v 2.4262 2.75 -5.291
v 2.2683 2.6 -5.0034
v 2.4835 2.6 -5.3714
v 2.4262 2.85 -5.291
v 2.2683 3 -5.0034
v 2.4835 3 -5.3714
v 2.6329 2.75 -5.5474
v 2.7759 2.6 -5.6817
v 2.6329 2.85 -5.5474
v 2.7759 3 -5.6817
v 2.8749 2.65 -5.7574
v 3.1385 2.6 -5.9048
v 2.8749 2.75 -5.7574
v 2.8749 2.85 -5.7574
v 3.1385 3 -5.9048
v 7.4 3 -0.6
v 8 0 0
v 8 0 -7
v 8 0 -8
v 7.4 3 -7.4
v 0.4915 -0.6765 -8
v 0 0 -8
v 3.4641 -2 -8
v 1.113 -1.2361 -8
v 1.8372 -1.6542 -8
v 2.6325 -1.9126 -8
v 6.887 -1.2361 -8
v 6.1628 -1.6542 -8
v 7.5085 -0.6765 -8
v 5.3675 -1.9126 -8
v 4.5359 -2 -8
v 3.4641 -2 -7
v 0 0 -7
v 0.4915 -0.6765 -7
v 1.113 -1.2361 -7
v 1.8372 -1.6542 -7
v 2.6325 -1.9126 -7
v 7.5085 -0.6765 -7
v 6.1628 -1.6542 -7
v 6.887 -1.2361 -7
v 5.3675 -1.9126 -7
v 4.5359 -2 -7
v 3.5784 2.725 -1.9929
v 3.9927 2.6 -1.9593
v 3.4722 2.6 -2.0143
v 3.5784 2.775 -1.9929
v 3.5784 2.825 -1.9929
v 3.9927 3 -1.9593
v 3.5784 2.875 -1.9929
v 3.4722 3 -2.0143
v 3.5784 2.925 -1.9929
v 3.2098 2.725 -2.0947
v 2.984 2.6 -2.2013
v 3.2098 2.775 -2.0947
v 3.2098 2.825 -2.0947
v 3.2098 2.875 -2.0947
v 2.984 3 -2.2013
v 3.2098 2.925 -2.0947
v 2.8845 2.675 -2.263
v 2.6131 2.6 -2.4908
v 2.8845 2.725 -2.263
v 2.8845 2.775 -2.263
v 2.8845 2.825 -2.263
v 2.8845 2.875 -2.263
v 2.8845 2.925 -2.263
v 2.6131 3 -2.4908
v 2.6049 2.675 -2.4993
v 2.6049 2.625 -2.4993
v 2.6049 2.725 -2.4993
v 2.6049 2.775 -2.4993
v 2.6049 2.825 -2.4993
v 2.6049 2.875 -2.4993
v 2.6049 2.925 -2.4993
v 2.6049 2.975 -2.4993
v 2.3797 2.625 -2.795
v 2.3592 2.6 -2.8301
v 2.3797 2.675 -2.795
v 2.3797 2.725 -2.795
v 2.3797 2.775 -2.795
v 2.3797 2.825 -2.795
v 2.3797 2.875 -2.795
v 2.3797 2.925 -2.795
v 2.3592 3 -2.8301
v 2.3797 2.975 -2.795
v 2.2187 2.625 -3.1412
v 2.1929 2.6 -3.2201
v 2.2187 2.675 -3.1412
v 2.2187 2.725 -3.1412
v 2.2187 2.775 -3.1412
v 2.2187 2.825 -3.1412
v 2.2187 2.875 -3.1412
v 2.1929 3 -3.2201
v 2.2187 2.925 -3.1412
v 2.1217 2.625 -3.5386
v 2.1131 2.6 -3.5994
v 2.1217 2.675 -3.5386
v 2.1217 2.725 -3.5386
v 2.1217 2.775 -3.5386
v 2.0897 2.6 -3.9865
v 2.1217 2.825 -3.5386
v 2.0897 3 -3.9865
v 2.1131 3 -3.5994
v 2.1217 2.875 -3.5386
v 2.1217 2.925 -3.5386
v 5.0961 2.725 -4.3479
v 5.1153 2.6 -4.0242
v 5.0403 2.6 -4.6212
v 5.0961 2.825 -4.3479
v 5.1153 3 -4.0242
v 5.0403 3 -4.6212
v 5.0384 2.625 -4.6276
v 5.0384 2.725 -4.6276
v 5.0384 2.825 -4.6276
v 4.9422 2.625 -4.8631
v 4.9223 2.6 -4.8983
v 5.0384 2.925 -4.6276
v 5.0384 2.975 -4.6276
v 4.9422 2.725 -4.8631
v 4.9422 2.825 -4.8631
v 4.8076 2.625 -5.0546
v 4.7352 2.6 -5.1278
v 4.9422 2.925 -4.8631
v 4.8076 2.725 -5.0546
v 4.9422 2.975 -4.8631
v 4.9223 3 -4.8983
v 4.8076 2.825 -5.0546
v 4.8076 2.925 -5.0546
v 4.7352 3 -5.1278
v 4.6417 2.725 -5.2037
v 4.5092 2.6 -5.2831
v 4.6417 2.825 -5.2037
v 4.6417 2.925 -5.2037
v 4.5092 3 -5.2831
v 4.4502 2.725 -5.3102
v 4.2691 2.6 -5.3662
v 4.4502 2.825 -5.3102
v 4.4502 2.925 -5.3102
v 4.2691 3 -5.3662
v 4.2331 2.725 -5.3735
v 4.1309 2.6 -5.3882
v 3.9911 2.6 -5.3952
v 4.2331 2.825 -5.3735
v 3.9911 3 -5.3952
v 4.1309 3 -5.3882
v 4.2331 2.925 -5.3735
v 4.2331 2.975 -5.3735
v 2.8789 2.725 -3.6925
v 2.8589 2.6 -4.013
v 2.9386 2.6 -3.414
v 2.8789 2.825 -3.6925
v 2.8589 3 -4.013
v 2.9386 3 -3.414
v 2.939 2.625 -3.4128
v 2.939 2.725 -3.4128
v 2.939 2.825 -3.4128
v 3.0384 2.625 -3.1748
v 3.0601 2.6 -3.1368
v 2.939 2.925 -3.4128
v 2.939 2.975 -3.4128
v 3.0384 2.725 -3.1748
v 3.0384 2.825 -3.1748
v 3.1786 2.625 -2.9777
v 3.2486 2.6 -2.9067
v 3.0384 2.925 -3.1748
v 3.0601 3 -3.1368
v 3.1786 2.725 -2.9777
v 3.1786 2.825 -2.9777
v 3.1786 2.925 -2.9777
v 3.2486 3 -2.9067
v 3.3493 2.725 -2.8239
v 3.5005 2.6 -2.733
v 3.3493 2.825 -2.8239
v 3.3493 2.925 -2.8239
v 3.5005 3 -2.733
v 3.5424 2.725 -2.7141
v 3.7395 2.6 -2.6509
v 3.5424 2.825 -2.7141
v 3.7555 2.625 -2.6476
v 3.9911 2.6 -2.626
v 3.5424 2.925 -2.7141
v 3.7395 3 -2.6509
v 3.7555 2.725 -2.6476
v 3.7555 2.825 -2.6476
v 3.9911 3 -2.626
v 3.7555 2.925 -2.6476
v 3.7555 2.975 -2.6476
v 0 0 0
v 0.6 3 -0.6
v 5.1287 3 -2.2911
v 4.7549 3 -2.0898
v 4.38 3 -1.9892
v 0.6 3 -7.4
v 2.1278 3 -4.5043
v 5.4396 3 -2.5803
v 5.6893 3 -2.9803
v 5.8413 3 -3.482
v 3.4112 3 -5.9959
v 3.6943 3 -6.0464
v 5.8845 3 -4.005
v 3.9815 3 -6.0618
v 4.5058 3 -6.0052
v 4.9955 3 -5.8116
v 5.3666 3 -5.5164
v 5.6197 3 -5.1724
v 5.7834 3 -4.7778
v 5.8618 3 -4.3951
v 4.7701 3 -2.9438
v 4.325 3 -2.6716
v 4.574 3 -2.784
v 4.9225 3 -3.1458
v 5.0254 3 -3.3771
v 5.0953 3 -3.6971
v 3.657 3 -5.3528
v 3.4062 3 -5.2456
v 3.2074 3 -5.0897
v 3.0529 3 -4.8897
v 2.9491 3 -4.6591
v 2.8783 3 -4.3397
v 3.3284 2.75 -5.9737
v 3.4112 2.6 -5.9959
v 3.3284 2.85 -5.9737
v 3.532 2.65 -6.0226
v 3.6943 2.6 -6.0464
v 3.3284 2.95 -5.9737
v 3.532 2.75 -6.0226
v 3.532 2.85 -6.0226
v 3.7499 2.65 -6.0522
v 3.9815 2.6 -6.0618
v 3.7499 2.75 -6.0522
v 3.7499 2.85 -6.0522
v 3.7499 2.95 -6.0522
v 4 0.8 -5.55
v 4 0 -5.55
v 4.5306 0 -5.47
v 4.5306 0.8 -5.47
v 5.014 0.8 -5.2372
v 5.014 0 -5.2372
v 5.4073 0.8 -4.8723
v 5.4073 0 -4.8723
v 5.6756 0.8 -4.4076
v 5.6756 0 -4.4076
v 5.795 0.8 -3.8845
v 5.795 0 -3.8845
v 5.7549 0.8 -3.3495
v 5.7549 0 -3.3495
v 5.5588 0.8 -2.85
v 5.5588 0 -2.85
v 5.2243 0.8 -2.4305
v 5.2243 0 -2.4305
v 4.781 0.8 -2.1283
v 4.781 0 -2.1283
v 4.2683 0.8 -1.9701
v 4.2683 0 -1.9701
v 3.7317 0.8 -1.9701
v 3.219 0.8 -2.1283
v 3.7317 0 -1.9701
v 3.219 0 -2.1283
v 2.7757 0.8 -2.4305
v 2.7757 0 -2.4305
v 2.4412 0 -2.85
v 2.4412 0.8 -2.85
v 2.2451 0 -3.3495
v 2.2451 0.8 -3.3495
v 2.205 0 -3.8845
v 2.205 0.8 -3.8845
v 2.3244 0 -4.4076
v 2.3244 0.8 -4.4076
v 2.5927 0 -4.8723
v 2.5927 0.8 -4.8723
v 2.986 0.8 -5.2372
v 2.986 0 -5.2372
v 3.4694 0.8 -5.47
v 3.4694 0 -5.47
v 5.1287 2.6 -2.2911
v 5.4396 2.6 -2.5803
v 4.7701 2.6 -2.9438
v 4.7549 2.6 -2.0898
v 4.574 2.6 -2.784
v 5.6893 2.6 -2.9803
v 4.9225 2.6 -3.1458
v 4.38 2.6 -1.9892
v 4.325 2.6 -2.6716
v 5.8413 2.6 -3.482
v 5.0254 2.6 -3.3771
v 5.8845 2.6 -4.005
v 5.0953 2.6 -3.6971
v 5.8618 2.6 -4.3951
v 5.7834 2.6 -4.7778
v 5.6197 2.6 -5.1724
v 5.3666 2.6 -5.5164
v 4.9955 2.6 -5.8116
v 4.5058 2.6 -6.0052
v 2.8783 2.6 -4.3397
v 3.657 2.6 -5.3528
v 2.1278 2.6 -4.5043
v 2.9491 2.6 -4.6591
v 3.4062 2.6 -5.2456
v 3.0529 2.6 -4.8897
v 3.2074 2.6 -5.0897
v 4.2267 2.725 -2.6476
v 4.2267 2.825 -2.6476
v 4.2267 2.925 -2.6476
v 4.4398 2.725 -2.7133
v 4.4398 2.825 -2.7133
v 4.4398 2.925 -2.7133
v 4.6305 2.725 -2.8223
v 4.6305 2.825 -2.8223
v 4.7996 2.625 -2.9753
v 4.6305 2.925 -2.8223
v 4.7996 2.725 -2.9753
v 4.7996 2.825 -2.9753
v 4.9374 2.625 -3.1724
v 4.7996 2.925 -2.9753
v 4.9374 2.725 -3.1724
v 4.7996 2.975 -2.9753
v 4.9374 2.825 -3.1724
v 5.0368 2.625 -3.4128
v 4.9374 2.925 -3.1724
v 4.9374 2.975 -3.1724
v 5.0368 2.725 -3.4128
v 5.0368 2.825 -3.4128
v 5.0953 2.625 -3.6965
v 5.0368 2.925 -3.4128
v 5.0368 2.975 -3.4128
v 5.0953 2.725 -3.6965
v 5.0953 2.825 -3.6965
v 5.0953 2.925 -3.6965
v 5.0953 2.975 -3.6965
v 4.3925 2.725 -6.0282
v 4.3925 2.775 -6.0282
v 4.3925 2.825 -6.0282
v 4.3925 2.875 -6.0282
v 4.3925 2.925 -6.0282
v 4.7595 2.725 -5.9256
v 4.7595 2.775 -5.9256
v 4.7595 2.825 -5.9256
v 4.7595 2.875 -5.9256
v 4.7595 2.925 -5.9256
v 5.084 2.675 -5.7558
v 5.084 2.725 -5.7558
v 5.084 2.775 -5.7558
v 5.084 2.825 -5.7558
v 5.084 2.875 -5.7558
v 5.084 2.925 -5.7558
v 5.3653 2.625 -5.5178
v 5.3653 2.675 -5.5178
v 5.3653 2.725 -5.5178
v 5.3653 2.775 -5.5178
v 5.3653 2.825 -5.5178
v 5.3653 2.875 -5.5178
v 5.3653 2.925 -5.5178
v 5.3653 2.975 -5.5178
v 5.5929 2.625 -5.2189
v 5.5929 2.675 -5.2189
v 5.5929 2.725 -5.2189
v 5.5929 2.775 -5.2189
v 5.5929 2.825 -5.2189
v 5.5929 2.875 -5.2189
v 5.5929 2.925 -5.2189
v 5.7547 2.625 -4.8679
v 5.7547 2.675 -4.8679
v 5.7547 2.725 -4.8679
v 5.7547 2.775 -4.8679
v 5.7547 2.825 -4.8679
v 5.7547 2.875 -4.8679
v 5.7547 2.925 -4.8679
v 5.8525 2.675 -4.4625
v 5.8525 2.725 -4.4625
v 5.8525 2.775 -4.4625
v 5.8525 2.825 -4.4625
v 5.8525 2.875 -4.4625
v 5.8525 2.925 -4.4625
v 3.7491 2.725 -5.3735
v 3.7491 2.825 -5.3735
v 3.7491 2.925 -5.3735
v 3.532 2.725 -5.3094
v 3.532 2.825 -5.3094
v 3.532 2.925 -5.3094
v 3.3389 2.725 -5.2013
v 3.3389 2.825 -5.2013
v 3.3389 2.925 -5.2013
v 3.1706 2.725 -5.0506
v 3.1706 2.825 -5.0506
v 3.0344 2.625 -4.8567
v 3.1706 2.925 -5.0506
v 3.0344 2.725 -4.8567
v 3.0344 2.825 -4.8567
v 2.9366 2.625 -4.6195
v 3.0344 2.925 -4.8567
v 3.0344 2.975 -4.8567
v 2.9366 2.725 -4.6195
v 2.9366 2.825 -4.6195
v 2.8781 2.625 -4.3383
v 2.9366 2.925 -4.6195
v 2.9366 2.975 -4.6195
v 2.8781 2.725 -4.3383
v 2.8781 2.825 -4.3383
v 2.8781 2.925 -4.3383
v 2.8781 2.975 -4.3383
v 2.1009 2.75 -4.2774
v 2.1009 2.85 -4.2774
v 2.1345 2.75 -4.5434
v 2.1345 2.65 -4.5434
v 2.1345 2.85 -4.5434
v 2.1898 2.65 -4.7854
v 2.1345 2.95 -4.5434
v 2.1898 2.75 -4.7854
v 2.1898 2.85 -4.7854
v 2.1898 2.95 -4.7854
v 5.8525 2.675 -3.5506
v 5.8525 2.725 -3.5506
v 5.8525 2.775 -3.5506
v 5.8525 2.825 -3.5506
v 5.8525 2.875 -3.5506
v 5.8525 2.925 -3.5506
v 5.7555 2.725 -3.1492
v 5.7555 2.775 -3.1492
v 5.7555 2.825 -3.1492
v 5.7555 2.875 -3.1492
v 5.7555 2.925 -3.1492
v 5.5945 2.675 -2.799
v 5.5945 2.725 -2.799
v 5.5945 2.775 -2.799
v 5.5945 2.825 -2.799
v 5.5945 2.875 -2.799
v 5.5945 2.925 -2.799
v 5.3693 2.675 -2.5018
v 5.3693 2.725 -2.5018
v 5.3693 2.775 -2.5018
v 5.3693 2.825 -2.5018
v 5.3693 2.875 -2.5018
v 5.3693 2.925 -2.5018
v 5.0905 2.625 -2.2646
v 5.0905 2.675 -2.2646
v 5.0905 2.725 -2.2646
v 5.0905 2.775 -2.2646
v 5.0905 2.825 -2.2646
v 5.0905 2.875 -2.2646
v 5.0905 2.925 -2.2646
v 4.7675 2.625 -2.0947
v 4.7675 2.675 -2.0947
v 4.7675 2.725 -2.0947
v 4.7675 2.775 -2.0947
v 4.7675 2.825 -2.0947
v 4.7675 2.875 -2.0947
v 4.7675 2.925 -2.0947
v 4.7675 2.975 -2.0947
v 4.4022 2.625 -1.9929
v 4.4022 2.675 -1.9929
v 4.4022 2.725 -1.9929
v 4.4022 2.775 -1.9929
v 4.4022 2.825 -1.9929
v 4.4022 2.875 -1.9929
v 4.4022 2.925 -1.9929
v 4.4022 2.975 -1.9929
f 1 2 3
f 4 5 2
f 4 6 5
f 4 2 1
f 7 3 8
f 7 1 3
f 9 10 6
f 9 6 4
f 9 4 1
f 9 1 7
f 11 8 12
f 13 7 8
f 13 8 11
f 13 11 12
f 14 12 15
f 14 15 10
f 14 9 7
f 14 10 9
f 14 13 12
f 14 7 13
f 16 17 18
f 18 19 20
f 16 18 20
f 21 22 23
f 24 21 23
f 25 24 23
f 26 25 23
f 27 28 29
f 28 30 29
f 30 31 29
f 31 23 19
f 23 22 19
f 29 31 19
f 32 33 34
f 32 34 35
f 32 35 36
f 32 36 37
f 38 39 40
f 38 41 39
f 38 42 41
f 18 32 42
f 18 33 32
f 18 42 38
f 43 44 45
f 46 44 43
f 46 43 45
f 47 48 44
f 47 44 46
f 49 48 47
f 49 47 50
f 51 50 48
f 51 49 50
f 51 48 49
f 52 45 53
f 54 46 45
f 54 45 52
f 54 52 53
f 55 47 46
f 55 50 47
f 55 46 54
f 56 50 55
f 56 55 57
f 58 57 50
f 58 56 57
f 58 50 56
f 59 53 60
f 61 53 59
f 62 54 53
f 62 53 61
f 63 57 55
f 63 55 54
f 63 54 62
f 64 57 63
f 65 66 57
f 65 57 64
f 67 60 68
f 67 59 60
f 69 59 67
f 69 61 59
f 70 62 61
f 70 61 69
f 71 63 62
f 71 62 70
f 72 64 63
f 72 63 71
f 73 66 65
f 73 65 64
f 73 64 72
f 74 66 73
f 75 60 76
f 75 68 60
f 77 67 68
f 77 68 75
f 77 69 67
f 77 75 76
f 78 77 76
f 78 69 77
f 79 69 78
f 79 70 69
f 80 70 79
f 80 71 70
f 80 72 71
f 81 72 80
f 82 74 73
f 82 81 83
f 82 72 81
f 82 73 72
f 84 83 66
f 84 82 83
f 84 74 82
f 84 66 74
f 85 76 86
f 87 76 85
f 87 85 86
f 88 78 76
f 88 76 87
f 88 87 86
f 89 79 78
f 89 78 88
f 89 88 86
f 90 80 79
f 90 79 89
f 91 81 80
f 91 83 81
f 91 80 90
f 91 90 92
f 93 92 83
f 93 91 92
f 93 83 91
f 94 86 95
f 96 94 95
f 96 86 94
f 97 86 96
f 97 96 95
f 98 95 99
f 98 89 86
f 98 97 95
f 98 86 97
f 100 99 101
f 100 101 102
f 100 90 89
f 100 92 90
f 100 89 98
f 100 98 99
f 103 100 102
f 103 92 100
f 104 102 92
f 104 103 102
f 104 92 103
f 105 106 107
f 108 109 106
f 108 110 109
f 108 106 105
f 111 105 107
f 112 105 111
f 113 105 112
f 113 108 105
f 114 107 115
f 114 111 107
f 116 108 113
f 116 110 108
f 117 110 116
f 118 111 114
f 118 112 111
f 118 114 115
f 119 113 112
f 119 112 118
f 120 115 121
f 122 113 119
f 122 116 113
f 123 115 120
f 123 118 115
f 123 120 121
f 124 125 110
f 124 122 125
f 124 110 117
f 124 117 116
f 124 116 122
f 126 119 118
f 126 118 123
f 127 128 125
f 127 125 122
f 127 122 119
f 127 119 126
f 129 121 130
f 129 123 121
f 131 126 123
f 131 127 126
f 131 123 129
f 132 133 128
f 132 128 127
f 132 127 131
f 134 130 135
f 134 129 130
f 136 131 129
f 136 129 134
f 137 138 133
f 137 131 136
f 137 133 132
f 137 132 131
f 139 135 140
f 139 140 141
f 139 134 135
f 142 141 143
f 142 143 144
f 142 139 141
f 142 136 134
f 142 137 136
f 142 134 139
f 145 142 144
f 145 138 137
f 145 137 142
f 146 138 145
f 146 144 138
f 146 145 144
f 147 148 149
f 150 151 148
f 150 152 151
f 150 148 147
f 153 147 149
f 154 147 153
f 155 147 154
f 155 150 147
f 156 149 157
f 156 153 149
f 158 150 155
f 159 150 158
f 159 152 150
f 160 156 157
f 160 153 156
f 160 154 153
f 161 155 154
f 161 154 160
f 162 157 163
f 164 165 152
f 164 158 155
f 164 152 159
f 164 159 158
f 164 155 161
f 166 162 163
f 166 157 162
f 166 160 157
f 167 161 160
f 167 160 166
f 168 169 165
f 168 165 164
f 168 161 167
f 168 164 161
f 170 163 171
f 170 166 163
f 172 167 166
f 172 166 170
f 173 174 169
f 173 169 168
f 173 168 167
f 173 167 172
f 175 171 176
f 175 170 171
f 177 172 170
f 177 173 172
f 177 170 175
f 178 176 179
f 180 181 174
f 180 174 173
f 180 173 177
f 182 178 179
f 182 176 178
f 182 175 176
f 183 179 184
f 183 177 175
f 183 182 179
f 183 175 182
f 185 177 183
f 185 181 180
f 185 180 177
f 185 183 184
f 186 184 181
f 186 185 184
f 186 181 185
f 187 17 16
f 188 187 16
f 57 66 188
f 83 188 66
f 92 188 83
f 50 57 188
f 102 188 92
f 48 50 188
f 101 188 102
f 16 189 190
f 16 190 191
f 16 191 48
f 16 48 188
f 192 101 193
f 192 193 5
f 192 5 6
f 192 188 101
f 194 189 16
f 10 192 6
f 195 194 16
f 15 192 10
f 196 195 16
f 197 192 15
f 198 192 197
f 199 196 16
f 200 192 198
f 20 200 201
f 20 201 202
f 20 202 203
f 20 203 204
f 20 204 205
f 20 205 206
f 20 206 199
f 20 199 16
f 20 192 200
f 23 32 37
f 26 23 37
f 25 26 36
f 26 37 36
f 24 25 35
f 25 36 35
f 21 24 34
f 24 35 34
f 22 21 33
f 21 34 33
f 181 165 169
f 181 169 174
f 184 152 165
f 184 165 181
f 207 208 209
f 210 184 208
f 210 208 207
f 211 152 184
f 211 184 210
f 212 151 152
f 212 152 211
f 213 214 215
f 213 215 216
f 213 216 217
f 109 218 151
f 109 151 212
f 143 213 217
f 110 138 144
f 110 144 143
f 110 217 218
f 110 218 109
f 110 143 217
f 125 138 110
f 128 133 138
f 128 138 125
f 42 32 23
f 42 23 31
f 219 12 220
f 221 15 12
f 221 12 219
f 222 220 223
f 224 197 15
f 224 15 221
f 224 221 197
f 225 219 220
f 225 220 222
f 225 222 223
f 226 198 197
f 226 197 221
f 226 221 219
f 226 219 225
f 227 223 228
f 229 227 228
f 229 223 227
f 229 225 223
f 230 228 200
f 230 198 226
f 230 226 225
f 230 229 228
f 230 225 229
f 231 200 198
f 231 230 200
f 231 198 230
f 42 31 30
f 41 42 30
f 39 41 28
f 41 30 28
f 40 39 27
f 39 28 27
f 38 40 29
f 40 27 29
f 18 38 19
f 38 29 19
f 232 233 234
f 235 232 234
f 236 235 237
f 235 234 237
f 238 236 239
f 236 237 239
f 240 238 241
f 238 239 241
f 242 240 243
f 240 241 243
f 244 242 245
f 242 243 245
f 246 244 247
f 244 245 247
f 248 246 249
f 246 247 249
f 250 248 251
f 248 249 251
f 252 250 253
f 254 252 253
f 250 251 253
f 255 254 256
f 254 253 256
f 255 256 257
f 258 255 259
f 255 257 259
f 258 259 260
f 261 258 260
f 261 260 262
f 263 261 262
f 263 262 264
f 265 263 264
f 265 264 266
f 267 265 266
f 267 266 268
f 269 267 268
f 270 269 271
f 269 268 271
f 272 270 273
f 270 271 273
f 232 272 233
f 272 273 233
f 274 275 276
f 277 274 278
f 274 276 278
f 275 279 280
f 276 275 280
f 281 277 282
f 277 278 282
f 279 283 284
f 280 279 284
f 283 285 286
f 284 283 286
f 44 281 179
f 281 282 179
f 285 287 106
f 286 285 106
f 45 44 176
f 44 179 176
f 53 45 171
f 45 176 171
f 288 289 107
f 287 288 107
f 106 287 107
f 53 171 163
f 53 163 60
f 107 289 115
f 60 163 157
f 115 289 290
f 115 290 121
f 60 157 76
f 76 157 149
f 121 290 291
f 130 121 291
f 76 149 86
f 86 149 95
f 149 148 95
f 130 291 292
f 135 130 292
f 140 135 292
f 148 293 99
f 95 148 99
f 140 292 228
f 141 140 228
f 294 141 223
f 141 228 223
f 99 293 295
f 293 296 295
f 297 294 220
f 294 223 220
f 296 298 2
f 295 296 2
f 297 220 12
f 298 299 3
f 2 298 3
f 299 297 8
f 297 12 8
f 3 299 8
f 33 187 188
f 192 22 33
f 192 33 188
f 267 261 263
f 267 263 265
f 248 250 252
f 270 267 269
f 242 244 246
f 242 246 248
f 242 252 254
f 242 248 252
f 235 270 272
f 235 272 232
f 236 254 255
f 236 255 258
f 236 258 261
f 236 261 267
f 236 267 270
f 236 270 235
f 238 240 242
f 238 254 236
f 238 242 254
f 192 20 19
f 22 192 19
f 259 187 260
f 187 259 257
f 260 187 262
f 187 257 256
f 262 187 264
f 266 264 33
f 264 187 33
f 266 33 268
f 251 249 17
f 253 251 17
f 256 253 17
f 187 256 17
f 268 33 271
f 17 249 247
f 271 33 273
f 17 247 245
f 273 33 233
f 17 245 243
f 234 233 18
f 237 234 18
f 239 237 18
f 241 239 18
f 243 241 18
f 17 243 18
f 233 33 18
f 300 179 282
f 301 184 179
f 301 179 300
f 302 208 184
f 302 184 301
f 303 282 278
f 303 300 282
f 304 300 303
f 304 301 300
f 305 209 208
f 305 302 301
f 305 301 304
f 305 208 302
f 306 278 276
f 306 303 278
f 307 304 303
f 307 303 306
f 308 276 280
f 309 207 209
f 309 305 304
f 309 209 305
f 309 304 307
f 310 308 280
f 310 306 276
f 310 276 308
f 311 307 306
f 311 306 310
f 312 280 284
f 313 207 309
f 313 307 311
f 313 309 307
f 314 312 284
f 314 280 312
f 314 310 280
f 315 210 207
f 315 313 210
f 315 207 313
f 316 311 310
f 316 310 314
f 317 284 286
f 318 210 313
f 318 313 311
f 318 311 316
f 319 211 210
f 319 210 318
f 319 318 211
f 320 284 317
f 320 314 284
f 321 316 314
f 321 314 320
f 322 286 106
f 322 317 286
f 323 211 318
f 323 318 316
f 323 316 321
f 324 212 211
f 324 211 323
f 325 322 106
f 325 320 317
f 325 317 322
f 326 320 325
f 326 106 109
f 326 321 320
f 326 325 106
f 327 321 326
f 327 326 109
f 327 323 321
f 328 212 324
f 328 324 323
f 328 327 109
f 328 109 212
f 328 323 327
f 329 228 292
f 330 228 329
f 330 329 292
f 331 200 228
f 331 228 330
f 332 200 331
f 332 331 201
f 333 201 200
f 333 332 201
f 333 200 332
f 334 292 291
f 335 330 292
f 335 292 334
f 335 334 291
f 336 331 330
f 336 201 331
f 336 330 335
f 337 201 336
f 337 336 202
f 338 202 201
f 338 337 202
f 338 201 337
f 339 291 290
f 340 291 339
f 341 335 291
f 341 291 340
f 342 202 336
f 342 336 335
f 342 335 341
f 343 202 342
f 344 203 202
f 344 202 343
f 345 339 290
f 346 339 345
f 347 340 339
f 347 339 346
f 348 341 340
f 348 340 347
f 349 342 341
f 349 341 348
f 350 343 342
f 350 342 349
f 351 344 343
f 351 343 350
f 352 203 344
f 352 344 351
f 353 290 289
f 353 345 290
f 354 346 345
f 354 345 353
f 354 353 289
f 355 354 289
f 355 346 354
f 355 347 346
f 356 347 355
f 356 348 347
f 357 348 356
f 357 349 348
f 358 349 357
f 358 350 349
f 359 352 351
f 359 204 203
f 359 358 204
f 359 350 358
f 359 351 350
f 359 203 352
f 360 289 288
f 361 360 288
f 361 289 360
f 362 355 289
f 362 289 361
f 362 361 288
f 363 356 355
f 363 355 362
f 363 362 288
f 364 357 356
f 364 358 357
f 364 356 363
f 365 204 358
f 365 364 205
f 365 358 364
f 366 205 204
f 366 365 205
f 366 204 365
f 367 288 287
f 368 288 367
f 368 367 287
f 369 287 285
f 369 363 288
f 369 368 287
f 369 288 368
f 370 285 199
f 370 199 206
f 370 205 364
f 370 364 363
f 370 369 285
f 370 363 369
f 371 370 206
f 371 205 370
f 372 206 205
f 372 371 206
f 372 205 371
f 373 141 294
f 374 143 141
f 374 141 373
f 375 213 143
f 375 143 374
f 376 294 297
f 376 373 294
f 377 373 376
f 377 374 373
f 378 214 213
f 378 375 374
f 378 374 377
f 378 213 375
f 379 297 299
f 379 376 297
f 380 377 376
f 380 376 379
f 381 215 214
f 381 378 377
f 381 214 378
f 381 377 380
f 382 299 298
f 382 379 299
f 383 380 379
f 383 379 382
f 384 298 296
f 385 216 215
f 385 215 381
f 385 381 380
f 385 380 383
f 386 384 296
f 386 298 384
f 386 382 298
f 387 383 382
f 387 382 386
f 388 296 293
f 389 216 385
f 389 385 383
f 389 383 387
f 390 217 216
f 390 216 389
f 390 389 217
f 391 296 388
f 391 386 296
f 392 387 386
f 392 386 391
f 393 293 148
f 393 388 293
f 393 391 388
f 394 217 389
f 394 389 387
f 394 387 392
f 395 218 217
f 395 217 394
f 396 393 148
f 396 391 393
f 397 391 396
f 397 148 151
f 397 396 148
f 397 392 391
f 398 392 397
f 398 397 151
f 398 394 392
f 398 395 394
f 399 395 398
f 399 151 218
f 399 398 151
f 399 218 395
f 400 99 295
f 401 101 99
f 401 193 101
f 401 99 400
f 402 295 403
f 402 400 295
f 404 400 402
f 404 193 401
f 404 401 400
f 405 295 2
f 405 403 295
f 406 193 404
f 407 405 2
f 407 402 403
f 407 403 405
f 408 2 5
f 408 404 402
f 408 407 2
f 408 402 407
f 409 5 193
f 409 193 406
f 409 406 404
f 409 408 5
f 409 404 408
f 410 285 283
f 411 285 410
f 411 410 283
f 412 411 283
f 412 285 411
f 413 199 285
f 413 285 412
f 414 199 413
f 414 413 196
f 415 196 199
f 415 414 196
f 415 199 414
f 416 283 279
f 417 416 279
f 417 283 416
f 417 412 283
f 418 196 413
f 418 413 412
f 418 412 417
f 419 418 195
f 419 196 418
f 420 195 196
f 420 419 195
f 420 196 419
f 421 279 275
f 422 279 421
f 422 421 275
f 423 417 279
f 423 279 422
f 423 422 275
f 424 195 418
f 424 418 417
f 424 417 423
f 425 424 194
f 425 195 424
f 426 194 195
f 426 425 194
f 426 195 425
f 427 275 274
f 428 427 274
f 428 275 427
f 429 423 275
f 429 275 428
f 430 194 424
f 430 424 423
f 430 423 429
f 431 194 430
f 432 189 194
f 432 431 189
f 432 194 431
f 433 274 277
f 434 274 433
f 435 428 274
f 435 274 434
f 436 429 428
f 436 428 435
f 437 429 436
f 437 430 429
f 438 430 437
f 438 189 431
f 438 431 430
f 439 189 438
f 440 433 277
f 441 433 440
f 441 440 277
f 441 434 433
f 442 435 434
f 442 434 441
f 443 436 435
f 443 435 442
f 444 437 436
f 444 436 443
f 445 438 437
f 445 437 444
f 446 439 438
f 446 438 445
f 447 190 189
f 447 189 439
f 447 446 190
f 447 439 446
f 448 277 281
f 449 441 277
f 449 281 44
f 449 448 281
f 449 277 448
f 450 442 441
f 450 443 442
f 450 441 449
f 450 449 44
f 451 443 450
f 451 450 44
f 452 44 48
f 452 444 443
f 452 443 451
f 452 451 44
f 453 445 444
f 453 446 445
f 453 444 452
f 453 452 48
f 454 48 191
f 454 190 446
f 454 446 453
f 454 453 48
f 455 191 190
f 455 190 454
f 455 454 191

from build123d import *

# Parameters (mm, degrees)
SKETCH1_W               = 8
SKETCH1_H               = 8
BOSS_EXTRUDE1_DEPTH     = 3
CUT_EXTRUDE1_DEPTH      = 12.704699911
CUT_EXTRUDE1_DEPTH_BACK = 12.704699911
CUT_EXTRUDE2_DEPTH      = 11
SKETCH4_R               = 1.8
CUT_EXTRUDE3_DEPTH      = 0.8
SKETCH5_W               = 8
SKETCH5_H               = 1
BOSS_EXTRUDE2_DEPTH     = 2
FILLET1_R               = 4
CUT_EXTRUDE4_DEPTH      = 0.4


with BuildPart() as part:
    # Sketch1 → Boss-Extrude1 (new body)
    with BuildSketch(Plane(origin=(0, 0, 0), x_dir=(1, 0, 0), z_dir=(0, 1, 0))):
        with Locations((4, 4)):
            Rectangle(SKETCH1_W, SKETCH1_H)
    extrude(amount=BOSS_EXTRUDE1_DEPTH)

    # Sketch2 → Cut-Extrude1 (cut, two sides: drawn at the far end of the back side and taken through both)
    with BuildSketch(Plane.XY.offset(-CUT_EXTRUDE1_DEPTH_BACK)):
        Polygon((0, 0), (0.6, 3), (0, 3), align=None)
        Polygon((8, 0), (7.4, 3), (8, 3), align=None)
    extrude(amount=CUT_EXTRUDE1_DEPTH + CUT_EXTRUDE1_DEPTH_BACK, mode=Mode.SUBTRACT)

    # Sketch3 → Cut-Extrude2 (cut)
    with BuildSketch(Plane(origin=(0, 0, 0), x_dir=(0, 0, -1), z_dir=(1, 0, 0))):
        Polygon((0, 0), (0.6, 3), (0, 3), align=None)
        Polygon((8, 3), (7.4, 3), (8, 0), align=None)
    extrude(amount=CUT_EXTRUDE2_DEPTH, mode=Mode.SUBTRACT)

    # Sketch4 → Cut-Extrude3 (cut)
    with BuildSketch(Plane.XZ):
        with Locations(Location((4, -3.75, 0), (0, 0, 270))):
            Circle(SKETCH4_R)
    extrude(amount=-CUT_EXTRUDE3_DEPTH, mode=Mode.SUBTRACT)

    # Sketch5 → Boss-Extrude2 (add)
    with BuildSketch(Plane.XZ):
        with Locations((4, -7.5)):
            Rectangle(SKETCH5_W, SKETCH5_H)
    extrude(amount=BOSS_EXTRUDE2_DEPTH)

    # Fillet1
    # the kernel refuses this fillet: 4 mm, written as the material it takes off along each edge
    with BuildSketch(Plane(origin=(8, -2, -16.660254038), x_dir=(0, 1, 0), z_dir=(0, 0, 1)), Plane(origin=(0, -2, 1.660254038), x_dir=(0, 1, 0), z_dir=(0, 0, -1))) as fillet1_piece_1:
        with BuildLine():
            CenterArc((4, 3.464101615), FILLET1_R, 180, 60)
            Line((0, 3.464101615), (-0.08, 3.464101615))
            Line((-0.08, 3.464101615), (-0.08, 0))
            Line((-0.08, 0), (0, -0.08))
            ThreePointArc((0, -0.08), (1, -0.08), (1.96, -0.069282032))
            Line((1.96, -0.069282032), (2, 0))
        make_face()
    extrude(amount=18.320508076, mode=Mode.SUBTRACT)

    # Sketch6 → Cut-Extrude4 (cut)
    with BuildSketch(Plane(origin=(0, 3, 0), x_dir=(1, 0, 0), z_dir=(0, 1, 0))):
        with BuildLine():
            add(Edge.make_bspline(
                [(2.089654898, 3.986528763), (2.089937962, 4.035959112), (2.090493863, 4.133033938), (2.100126328, 4.27544635), (2.112822668, 4.411953966), (2.133498637, 4.542019848), (2.157821125, 4.666252751), (2.188242102, 4.784615798), (2.224888607, 4.896693893), (2.254041192, 4.968254545), (2.268340796, 5.003355686)],
                knots=[0, 0, 0, 0, 1.141009212, 2.240794809, 3.294380675, 4.305229195, 5.280013876, 6.216333343, 7.125095522, 8, 8, 8, 8], degree=3))
            add(Edge.make_bspline(
                [(2.268340796, 5.003355686), (2.291715222, 5.053256024), (2.338189152, 5.15246979), (2.424498545, 5.292666818), (2.522325153, 5.424883974), (2.630863596, 5.548428123), (2.747342854, 5.661439376), (2.872312421, 5.758160736), (3.001332505, 5.841858689), (3.093095075, 5.883953785), (3.138533104, 5.904797994)],
                knots=[0, 0, 0, 0, 1.031372299, 2.050613973, 3.077158538, 4.108712802, 5.127684358, 6.111366908, 7.06480644, 8, 8, 8, 8], degree=3))
            add(Edge.make_bspline(
                [(3.138533104, 5.904797994), (3.169376267, 5.917449171), (3.231718165, 5.943020427), (3.328604813, 5.974934694), (3.429167615, 6.000863593), (3.532679205, 6.024041008), (3.640144595, 6.040022598), (3.750695421, 6.053422612), (3.864936689, 6.060445793), (3.94221093, 6.06137636), (3.981481822, 6.061849276)],
                knots=[0, 0, 0, 0, 0.92659354, 1.872881803, 2.832850937, 3.813025581, 4.820167273, 5.851730198, 6.908245912, 8, 8, 8, 8], degree=3))
            add(Edge.make_bspline(
                [(3.981481822, 6.061849276), (4.051799393, 6.060086645), (4.189411847, 6.056637153), (4.390424999, 6.03172188), (4.580644474, 5.989650147), (4.759426374, 5.9288409), (4.928312103, 5.852828021), (5.085989518, 5.7585427), (5.232691986, 5.647005393), (5.368136158, 5.519745635), (5.490113336, 5.376985207), (5.596345325, 5.220057705), (5.685459602, 5.049698506), (5.758850354, 4.866377637), (5.815245616, 4.669496317), (5.855991141, 4.459610063), (5.880197281, 4.23656428), (5.883057671, 4.083544992), (5.884526693, 4.00495825)],
                knots=[0, 0, 0, 0, 1.064641025, 2.083517118, 3.061799897, 4.009540929, 4.938075217, 5.861300345, 6.78508344, 7.723570974, 8.670267188, 9.622657076, 10.586935816, 11.576069104, 12.607749008, 13.683335114, 14.81022093, 16, 16, 16, 16], degree=3))
            add(Edge.make_bspline(
                [(5.884526693, 4.00495825), (5.883091601, 3.926897736), (5.880297745, 3.774928499), (5.855639782, 3.553632965), (5.816583507, 3.345276789), (5.758823703, 3.150335932), (5.687623357, 2.967322864), (5.597592073, 2.798417418), (5.493584902, 2.641379175), (5.37178097, 2.500157102), (5.2386164, 2.372167), (5.092100017, 2.261933284), (4.935570416, 2.167520211), (4.767605484, 2.091287667), (4.589299985, 2.031730764), (4.400072033, 1.989335741), (4.199824576, 1.964516346), (4.062748303, 1.961054329), (3.99269977, 1.959285173)],
                knots=[0, 0, 0, 0, 1.18845052, 2.313691126, 3.386664782, 4.412527756, 5.405809582, 6.372003093, 7.321919452, 8.268293321, 9.206237639, 10.129603466, 11.054616372, 11.9847576, 12.932764752, 13.912672021, 14.933336461, 16, 16, 16, 16], degree=3))
            add(Edge.make_bspline(
                [(3.99269977, 1.959285173), (3.921851099, 1.961058411), (3.783179897, 1.964529147), (3.580796614, 1.989272994), (3.389690252, 2.031681973), (3.209996896, 2.091448367), (3.040491004, 2.166522847), (2.882737558, 2.259971154), (2.736649357, 2.370903), (2.60237212, 2.497386547), (2.480643503, 2.638193424), (2.376784009, 2.794221956), (2.286748029, 2.961477617), (2.215173347, 3.142493932), (2.157731606, 3.335408473), (2.118579893, 3.541331287), (2.09387425, 3.75969562), (2.091087056, 3.909535694), (2.089654898, 3.986528763)],
                knots=[0, 0, 0, 0, 1.080878253, 2.11558926, 3.1052859, 4.062802436, 5.000434901, 5.928596448, 6.853693179, 7.793554778, 8.738606028, 9.68692032, 10.647726704, 11.63151566, 12.651483354, 13.714466703, 14.825613081, 16, 16, 16, 16], degree=3))
        make_face()
        with BuildLine():
            add(Edge.make_bspline(
                [(2.858885668, 4.012971071), (2.85965412, 3.957640503), (2.861142212, 3.850493912), (2.876992368, 3.694973228), (2.901046254, 3.549583199), (2.936421027, 3.414488839), (2.98111032, 3.289592419), (3.035863968, 3.174789463), (3.100455695, 3.069908984), (3.176556171, 2.977165157), (3.258890919, 2.894362796), (3.347763935, 2.822717871), (3.441518937, 2.761052648), (3.541778172, 2.712368162), (3.646455066, 2.673731696), (3.756362885, 2.645084172), (3.872048117, 2.629353868), (3.950988508, 2.627098013), (3.991097206, 2.62595184)],
                knots=[0, 0, 0, 0, 1.313550922, 2.543666373, 3.708465049, 4.810029406, 5.85539231, 6.85404609, 7.825601258, 8.772642133, 9.696587791, 10.59409323, 11.479048685, 12.35559886, 13.234601248, 14.125357077, 15.047515647, 16, 16, 16, 16], degree=3))
            add(Edge.make_bspline(
                [(3.991097206, 2.62595184), (4.031211308, 2.62707479), (4.110162334, 2.629284937), (4.225705423, 2.645336869), (4.335831051, 2.6727565), (4.440092094, 2.711194976), (4.538963761, 2.760652512), (4.632359934, 2.820935331), (4.719742254, 2.892906209), (4.801987382, 2.974505658), (4.876033724, 3.06786548), (4.940075505, 3.17272786), (4.994802176, 3.288227099), (5.039496175, 3.414406406), (5.074000367, 3.551503186), (5.097072556, 3.699589977), (5.113050883, 3.858243352), (5.114532906, 3.967789388), (5.115295924, 4.02418902)],
                knots=[0, 0, 0, 0, 0.949153107, 1.868086493, 2.754172764, 3.630100905, 4.492260106, 5.365378617, 6.254840125, 7.166615376, 8.102436631, 9.067266169, 10.06813181, 11.121736829, 12.23011542, 13.408501285, 14.665770308, 16, 16, 16, 16], degree=3))
            add(Edge.make_bspline(
                [(5.115295924, 4.02418902), (5.114434086, 4.080044083), (5.112765054, 4.18821272), (5.098229512, 4.344863246), (5.07442298, 4.490602534), (5.041329269, 4.625392829), (4.997593851, 4.74925585), (4.945357013, 4.862530314), (4.882195257, 4.964624424), (4.809756461, 5.055485317), (4.729599598, 5.135460421), (4.643086506, 5.205475199), (4.549725647, 5.26373175), (4.45042821, 5.312746734), (4.344160403, 5.349110772), (4.232002157, 5.375634395), (4.113636071, 5.391967682), (4.032549387, 5.394095071), (3.991097206, 5.395182609)],
                knots=[0, 0, 0, 0, 1.332337092, 2.580197383, 3.749299508, 4.852775005, 5.886662144, 6.878700295, 7.822989687, 8.743523536, 9.644687758, 10.519443927, 11.392806431, 12.264866173, 13.155606721, 14.065961015, 15.011303331, 16, 16, 16, 16], degree=3))
            add(Edge.make_bspline(
                [(3.991097206, 5.395182609), (3.949639786, 5.394111799), (3.868542852, 5.392017134), (3.749992261, 5.375413426), (3.637480681, 5.349680139), (3.531227894, 5.311239711), (3.431065544, 5.262695426), (3.337364104, 5.202490837), (3.249385236, 5.13259488), (3.168510191, 5.05140717), (3.094897659, 4.95975062), (3.031705485, 4.856409024), (2.977820274, 4.742511001), (2.933610582, 4.617719403), (2.900837529, 4.481690937), (2.87564871, 4.335339795), (2.861503604, 4.177780175), (2.859777069, 4.069088169), (2.858885668, 4.012971071)],
                knots=[0, 0, 0, 0, 0.981996942, 1.920933313, 2.83127778, 3.712125466, 4.592427284, 5.463259035, 6.34592384, 7.249932058, 8.173122297, 9.125107726, 10.113123258, 11.154048744, 12.256187849, 13.424658091, 14.670364834, 16, 16, 16, 16], degree=3))
        make_face(mode=Mode.SUBTRACT)
    extrude(amount=-CUT_EXTRUDE4_DEPTH, mode=Mode.SUBTRACT)


solid = part.part
